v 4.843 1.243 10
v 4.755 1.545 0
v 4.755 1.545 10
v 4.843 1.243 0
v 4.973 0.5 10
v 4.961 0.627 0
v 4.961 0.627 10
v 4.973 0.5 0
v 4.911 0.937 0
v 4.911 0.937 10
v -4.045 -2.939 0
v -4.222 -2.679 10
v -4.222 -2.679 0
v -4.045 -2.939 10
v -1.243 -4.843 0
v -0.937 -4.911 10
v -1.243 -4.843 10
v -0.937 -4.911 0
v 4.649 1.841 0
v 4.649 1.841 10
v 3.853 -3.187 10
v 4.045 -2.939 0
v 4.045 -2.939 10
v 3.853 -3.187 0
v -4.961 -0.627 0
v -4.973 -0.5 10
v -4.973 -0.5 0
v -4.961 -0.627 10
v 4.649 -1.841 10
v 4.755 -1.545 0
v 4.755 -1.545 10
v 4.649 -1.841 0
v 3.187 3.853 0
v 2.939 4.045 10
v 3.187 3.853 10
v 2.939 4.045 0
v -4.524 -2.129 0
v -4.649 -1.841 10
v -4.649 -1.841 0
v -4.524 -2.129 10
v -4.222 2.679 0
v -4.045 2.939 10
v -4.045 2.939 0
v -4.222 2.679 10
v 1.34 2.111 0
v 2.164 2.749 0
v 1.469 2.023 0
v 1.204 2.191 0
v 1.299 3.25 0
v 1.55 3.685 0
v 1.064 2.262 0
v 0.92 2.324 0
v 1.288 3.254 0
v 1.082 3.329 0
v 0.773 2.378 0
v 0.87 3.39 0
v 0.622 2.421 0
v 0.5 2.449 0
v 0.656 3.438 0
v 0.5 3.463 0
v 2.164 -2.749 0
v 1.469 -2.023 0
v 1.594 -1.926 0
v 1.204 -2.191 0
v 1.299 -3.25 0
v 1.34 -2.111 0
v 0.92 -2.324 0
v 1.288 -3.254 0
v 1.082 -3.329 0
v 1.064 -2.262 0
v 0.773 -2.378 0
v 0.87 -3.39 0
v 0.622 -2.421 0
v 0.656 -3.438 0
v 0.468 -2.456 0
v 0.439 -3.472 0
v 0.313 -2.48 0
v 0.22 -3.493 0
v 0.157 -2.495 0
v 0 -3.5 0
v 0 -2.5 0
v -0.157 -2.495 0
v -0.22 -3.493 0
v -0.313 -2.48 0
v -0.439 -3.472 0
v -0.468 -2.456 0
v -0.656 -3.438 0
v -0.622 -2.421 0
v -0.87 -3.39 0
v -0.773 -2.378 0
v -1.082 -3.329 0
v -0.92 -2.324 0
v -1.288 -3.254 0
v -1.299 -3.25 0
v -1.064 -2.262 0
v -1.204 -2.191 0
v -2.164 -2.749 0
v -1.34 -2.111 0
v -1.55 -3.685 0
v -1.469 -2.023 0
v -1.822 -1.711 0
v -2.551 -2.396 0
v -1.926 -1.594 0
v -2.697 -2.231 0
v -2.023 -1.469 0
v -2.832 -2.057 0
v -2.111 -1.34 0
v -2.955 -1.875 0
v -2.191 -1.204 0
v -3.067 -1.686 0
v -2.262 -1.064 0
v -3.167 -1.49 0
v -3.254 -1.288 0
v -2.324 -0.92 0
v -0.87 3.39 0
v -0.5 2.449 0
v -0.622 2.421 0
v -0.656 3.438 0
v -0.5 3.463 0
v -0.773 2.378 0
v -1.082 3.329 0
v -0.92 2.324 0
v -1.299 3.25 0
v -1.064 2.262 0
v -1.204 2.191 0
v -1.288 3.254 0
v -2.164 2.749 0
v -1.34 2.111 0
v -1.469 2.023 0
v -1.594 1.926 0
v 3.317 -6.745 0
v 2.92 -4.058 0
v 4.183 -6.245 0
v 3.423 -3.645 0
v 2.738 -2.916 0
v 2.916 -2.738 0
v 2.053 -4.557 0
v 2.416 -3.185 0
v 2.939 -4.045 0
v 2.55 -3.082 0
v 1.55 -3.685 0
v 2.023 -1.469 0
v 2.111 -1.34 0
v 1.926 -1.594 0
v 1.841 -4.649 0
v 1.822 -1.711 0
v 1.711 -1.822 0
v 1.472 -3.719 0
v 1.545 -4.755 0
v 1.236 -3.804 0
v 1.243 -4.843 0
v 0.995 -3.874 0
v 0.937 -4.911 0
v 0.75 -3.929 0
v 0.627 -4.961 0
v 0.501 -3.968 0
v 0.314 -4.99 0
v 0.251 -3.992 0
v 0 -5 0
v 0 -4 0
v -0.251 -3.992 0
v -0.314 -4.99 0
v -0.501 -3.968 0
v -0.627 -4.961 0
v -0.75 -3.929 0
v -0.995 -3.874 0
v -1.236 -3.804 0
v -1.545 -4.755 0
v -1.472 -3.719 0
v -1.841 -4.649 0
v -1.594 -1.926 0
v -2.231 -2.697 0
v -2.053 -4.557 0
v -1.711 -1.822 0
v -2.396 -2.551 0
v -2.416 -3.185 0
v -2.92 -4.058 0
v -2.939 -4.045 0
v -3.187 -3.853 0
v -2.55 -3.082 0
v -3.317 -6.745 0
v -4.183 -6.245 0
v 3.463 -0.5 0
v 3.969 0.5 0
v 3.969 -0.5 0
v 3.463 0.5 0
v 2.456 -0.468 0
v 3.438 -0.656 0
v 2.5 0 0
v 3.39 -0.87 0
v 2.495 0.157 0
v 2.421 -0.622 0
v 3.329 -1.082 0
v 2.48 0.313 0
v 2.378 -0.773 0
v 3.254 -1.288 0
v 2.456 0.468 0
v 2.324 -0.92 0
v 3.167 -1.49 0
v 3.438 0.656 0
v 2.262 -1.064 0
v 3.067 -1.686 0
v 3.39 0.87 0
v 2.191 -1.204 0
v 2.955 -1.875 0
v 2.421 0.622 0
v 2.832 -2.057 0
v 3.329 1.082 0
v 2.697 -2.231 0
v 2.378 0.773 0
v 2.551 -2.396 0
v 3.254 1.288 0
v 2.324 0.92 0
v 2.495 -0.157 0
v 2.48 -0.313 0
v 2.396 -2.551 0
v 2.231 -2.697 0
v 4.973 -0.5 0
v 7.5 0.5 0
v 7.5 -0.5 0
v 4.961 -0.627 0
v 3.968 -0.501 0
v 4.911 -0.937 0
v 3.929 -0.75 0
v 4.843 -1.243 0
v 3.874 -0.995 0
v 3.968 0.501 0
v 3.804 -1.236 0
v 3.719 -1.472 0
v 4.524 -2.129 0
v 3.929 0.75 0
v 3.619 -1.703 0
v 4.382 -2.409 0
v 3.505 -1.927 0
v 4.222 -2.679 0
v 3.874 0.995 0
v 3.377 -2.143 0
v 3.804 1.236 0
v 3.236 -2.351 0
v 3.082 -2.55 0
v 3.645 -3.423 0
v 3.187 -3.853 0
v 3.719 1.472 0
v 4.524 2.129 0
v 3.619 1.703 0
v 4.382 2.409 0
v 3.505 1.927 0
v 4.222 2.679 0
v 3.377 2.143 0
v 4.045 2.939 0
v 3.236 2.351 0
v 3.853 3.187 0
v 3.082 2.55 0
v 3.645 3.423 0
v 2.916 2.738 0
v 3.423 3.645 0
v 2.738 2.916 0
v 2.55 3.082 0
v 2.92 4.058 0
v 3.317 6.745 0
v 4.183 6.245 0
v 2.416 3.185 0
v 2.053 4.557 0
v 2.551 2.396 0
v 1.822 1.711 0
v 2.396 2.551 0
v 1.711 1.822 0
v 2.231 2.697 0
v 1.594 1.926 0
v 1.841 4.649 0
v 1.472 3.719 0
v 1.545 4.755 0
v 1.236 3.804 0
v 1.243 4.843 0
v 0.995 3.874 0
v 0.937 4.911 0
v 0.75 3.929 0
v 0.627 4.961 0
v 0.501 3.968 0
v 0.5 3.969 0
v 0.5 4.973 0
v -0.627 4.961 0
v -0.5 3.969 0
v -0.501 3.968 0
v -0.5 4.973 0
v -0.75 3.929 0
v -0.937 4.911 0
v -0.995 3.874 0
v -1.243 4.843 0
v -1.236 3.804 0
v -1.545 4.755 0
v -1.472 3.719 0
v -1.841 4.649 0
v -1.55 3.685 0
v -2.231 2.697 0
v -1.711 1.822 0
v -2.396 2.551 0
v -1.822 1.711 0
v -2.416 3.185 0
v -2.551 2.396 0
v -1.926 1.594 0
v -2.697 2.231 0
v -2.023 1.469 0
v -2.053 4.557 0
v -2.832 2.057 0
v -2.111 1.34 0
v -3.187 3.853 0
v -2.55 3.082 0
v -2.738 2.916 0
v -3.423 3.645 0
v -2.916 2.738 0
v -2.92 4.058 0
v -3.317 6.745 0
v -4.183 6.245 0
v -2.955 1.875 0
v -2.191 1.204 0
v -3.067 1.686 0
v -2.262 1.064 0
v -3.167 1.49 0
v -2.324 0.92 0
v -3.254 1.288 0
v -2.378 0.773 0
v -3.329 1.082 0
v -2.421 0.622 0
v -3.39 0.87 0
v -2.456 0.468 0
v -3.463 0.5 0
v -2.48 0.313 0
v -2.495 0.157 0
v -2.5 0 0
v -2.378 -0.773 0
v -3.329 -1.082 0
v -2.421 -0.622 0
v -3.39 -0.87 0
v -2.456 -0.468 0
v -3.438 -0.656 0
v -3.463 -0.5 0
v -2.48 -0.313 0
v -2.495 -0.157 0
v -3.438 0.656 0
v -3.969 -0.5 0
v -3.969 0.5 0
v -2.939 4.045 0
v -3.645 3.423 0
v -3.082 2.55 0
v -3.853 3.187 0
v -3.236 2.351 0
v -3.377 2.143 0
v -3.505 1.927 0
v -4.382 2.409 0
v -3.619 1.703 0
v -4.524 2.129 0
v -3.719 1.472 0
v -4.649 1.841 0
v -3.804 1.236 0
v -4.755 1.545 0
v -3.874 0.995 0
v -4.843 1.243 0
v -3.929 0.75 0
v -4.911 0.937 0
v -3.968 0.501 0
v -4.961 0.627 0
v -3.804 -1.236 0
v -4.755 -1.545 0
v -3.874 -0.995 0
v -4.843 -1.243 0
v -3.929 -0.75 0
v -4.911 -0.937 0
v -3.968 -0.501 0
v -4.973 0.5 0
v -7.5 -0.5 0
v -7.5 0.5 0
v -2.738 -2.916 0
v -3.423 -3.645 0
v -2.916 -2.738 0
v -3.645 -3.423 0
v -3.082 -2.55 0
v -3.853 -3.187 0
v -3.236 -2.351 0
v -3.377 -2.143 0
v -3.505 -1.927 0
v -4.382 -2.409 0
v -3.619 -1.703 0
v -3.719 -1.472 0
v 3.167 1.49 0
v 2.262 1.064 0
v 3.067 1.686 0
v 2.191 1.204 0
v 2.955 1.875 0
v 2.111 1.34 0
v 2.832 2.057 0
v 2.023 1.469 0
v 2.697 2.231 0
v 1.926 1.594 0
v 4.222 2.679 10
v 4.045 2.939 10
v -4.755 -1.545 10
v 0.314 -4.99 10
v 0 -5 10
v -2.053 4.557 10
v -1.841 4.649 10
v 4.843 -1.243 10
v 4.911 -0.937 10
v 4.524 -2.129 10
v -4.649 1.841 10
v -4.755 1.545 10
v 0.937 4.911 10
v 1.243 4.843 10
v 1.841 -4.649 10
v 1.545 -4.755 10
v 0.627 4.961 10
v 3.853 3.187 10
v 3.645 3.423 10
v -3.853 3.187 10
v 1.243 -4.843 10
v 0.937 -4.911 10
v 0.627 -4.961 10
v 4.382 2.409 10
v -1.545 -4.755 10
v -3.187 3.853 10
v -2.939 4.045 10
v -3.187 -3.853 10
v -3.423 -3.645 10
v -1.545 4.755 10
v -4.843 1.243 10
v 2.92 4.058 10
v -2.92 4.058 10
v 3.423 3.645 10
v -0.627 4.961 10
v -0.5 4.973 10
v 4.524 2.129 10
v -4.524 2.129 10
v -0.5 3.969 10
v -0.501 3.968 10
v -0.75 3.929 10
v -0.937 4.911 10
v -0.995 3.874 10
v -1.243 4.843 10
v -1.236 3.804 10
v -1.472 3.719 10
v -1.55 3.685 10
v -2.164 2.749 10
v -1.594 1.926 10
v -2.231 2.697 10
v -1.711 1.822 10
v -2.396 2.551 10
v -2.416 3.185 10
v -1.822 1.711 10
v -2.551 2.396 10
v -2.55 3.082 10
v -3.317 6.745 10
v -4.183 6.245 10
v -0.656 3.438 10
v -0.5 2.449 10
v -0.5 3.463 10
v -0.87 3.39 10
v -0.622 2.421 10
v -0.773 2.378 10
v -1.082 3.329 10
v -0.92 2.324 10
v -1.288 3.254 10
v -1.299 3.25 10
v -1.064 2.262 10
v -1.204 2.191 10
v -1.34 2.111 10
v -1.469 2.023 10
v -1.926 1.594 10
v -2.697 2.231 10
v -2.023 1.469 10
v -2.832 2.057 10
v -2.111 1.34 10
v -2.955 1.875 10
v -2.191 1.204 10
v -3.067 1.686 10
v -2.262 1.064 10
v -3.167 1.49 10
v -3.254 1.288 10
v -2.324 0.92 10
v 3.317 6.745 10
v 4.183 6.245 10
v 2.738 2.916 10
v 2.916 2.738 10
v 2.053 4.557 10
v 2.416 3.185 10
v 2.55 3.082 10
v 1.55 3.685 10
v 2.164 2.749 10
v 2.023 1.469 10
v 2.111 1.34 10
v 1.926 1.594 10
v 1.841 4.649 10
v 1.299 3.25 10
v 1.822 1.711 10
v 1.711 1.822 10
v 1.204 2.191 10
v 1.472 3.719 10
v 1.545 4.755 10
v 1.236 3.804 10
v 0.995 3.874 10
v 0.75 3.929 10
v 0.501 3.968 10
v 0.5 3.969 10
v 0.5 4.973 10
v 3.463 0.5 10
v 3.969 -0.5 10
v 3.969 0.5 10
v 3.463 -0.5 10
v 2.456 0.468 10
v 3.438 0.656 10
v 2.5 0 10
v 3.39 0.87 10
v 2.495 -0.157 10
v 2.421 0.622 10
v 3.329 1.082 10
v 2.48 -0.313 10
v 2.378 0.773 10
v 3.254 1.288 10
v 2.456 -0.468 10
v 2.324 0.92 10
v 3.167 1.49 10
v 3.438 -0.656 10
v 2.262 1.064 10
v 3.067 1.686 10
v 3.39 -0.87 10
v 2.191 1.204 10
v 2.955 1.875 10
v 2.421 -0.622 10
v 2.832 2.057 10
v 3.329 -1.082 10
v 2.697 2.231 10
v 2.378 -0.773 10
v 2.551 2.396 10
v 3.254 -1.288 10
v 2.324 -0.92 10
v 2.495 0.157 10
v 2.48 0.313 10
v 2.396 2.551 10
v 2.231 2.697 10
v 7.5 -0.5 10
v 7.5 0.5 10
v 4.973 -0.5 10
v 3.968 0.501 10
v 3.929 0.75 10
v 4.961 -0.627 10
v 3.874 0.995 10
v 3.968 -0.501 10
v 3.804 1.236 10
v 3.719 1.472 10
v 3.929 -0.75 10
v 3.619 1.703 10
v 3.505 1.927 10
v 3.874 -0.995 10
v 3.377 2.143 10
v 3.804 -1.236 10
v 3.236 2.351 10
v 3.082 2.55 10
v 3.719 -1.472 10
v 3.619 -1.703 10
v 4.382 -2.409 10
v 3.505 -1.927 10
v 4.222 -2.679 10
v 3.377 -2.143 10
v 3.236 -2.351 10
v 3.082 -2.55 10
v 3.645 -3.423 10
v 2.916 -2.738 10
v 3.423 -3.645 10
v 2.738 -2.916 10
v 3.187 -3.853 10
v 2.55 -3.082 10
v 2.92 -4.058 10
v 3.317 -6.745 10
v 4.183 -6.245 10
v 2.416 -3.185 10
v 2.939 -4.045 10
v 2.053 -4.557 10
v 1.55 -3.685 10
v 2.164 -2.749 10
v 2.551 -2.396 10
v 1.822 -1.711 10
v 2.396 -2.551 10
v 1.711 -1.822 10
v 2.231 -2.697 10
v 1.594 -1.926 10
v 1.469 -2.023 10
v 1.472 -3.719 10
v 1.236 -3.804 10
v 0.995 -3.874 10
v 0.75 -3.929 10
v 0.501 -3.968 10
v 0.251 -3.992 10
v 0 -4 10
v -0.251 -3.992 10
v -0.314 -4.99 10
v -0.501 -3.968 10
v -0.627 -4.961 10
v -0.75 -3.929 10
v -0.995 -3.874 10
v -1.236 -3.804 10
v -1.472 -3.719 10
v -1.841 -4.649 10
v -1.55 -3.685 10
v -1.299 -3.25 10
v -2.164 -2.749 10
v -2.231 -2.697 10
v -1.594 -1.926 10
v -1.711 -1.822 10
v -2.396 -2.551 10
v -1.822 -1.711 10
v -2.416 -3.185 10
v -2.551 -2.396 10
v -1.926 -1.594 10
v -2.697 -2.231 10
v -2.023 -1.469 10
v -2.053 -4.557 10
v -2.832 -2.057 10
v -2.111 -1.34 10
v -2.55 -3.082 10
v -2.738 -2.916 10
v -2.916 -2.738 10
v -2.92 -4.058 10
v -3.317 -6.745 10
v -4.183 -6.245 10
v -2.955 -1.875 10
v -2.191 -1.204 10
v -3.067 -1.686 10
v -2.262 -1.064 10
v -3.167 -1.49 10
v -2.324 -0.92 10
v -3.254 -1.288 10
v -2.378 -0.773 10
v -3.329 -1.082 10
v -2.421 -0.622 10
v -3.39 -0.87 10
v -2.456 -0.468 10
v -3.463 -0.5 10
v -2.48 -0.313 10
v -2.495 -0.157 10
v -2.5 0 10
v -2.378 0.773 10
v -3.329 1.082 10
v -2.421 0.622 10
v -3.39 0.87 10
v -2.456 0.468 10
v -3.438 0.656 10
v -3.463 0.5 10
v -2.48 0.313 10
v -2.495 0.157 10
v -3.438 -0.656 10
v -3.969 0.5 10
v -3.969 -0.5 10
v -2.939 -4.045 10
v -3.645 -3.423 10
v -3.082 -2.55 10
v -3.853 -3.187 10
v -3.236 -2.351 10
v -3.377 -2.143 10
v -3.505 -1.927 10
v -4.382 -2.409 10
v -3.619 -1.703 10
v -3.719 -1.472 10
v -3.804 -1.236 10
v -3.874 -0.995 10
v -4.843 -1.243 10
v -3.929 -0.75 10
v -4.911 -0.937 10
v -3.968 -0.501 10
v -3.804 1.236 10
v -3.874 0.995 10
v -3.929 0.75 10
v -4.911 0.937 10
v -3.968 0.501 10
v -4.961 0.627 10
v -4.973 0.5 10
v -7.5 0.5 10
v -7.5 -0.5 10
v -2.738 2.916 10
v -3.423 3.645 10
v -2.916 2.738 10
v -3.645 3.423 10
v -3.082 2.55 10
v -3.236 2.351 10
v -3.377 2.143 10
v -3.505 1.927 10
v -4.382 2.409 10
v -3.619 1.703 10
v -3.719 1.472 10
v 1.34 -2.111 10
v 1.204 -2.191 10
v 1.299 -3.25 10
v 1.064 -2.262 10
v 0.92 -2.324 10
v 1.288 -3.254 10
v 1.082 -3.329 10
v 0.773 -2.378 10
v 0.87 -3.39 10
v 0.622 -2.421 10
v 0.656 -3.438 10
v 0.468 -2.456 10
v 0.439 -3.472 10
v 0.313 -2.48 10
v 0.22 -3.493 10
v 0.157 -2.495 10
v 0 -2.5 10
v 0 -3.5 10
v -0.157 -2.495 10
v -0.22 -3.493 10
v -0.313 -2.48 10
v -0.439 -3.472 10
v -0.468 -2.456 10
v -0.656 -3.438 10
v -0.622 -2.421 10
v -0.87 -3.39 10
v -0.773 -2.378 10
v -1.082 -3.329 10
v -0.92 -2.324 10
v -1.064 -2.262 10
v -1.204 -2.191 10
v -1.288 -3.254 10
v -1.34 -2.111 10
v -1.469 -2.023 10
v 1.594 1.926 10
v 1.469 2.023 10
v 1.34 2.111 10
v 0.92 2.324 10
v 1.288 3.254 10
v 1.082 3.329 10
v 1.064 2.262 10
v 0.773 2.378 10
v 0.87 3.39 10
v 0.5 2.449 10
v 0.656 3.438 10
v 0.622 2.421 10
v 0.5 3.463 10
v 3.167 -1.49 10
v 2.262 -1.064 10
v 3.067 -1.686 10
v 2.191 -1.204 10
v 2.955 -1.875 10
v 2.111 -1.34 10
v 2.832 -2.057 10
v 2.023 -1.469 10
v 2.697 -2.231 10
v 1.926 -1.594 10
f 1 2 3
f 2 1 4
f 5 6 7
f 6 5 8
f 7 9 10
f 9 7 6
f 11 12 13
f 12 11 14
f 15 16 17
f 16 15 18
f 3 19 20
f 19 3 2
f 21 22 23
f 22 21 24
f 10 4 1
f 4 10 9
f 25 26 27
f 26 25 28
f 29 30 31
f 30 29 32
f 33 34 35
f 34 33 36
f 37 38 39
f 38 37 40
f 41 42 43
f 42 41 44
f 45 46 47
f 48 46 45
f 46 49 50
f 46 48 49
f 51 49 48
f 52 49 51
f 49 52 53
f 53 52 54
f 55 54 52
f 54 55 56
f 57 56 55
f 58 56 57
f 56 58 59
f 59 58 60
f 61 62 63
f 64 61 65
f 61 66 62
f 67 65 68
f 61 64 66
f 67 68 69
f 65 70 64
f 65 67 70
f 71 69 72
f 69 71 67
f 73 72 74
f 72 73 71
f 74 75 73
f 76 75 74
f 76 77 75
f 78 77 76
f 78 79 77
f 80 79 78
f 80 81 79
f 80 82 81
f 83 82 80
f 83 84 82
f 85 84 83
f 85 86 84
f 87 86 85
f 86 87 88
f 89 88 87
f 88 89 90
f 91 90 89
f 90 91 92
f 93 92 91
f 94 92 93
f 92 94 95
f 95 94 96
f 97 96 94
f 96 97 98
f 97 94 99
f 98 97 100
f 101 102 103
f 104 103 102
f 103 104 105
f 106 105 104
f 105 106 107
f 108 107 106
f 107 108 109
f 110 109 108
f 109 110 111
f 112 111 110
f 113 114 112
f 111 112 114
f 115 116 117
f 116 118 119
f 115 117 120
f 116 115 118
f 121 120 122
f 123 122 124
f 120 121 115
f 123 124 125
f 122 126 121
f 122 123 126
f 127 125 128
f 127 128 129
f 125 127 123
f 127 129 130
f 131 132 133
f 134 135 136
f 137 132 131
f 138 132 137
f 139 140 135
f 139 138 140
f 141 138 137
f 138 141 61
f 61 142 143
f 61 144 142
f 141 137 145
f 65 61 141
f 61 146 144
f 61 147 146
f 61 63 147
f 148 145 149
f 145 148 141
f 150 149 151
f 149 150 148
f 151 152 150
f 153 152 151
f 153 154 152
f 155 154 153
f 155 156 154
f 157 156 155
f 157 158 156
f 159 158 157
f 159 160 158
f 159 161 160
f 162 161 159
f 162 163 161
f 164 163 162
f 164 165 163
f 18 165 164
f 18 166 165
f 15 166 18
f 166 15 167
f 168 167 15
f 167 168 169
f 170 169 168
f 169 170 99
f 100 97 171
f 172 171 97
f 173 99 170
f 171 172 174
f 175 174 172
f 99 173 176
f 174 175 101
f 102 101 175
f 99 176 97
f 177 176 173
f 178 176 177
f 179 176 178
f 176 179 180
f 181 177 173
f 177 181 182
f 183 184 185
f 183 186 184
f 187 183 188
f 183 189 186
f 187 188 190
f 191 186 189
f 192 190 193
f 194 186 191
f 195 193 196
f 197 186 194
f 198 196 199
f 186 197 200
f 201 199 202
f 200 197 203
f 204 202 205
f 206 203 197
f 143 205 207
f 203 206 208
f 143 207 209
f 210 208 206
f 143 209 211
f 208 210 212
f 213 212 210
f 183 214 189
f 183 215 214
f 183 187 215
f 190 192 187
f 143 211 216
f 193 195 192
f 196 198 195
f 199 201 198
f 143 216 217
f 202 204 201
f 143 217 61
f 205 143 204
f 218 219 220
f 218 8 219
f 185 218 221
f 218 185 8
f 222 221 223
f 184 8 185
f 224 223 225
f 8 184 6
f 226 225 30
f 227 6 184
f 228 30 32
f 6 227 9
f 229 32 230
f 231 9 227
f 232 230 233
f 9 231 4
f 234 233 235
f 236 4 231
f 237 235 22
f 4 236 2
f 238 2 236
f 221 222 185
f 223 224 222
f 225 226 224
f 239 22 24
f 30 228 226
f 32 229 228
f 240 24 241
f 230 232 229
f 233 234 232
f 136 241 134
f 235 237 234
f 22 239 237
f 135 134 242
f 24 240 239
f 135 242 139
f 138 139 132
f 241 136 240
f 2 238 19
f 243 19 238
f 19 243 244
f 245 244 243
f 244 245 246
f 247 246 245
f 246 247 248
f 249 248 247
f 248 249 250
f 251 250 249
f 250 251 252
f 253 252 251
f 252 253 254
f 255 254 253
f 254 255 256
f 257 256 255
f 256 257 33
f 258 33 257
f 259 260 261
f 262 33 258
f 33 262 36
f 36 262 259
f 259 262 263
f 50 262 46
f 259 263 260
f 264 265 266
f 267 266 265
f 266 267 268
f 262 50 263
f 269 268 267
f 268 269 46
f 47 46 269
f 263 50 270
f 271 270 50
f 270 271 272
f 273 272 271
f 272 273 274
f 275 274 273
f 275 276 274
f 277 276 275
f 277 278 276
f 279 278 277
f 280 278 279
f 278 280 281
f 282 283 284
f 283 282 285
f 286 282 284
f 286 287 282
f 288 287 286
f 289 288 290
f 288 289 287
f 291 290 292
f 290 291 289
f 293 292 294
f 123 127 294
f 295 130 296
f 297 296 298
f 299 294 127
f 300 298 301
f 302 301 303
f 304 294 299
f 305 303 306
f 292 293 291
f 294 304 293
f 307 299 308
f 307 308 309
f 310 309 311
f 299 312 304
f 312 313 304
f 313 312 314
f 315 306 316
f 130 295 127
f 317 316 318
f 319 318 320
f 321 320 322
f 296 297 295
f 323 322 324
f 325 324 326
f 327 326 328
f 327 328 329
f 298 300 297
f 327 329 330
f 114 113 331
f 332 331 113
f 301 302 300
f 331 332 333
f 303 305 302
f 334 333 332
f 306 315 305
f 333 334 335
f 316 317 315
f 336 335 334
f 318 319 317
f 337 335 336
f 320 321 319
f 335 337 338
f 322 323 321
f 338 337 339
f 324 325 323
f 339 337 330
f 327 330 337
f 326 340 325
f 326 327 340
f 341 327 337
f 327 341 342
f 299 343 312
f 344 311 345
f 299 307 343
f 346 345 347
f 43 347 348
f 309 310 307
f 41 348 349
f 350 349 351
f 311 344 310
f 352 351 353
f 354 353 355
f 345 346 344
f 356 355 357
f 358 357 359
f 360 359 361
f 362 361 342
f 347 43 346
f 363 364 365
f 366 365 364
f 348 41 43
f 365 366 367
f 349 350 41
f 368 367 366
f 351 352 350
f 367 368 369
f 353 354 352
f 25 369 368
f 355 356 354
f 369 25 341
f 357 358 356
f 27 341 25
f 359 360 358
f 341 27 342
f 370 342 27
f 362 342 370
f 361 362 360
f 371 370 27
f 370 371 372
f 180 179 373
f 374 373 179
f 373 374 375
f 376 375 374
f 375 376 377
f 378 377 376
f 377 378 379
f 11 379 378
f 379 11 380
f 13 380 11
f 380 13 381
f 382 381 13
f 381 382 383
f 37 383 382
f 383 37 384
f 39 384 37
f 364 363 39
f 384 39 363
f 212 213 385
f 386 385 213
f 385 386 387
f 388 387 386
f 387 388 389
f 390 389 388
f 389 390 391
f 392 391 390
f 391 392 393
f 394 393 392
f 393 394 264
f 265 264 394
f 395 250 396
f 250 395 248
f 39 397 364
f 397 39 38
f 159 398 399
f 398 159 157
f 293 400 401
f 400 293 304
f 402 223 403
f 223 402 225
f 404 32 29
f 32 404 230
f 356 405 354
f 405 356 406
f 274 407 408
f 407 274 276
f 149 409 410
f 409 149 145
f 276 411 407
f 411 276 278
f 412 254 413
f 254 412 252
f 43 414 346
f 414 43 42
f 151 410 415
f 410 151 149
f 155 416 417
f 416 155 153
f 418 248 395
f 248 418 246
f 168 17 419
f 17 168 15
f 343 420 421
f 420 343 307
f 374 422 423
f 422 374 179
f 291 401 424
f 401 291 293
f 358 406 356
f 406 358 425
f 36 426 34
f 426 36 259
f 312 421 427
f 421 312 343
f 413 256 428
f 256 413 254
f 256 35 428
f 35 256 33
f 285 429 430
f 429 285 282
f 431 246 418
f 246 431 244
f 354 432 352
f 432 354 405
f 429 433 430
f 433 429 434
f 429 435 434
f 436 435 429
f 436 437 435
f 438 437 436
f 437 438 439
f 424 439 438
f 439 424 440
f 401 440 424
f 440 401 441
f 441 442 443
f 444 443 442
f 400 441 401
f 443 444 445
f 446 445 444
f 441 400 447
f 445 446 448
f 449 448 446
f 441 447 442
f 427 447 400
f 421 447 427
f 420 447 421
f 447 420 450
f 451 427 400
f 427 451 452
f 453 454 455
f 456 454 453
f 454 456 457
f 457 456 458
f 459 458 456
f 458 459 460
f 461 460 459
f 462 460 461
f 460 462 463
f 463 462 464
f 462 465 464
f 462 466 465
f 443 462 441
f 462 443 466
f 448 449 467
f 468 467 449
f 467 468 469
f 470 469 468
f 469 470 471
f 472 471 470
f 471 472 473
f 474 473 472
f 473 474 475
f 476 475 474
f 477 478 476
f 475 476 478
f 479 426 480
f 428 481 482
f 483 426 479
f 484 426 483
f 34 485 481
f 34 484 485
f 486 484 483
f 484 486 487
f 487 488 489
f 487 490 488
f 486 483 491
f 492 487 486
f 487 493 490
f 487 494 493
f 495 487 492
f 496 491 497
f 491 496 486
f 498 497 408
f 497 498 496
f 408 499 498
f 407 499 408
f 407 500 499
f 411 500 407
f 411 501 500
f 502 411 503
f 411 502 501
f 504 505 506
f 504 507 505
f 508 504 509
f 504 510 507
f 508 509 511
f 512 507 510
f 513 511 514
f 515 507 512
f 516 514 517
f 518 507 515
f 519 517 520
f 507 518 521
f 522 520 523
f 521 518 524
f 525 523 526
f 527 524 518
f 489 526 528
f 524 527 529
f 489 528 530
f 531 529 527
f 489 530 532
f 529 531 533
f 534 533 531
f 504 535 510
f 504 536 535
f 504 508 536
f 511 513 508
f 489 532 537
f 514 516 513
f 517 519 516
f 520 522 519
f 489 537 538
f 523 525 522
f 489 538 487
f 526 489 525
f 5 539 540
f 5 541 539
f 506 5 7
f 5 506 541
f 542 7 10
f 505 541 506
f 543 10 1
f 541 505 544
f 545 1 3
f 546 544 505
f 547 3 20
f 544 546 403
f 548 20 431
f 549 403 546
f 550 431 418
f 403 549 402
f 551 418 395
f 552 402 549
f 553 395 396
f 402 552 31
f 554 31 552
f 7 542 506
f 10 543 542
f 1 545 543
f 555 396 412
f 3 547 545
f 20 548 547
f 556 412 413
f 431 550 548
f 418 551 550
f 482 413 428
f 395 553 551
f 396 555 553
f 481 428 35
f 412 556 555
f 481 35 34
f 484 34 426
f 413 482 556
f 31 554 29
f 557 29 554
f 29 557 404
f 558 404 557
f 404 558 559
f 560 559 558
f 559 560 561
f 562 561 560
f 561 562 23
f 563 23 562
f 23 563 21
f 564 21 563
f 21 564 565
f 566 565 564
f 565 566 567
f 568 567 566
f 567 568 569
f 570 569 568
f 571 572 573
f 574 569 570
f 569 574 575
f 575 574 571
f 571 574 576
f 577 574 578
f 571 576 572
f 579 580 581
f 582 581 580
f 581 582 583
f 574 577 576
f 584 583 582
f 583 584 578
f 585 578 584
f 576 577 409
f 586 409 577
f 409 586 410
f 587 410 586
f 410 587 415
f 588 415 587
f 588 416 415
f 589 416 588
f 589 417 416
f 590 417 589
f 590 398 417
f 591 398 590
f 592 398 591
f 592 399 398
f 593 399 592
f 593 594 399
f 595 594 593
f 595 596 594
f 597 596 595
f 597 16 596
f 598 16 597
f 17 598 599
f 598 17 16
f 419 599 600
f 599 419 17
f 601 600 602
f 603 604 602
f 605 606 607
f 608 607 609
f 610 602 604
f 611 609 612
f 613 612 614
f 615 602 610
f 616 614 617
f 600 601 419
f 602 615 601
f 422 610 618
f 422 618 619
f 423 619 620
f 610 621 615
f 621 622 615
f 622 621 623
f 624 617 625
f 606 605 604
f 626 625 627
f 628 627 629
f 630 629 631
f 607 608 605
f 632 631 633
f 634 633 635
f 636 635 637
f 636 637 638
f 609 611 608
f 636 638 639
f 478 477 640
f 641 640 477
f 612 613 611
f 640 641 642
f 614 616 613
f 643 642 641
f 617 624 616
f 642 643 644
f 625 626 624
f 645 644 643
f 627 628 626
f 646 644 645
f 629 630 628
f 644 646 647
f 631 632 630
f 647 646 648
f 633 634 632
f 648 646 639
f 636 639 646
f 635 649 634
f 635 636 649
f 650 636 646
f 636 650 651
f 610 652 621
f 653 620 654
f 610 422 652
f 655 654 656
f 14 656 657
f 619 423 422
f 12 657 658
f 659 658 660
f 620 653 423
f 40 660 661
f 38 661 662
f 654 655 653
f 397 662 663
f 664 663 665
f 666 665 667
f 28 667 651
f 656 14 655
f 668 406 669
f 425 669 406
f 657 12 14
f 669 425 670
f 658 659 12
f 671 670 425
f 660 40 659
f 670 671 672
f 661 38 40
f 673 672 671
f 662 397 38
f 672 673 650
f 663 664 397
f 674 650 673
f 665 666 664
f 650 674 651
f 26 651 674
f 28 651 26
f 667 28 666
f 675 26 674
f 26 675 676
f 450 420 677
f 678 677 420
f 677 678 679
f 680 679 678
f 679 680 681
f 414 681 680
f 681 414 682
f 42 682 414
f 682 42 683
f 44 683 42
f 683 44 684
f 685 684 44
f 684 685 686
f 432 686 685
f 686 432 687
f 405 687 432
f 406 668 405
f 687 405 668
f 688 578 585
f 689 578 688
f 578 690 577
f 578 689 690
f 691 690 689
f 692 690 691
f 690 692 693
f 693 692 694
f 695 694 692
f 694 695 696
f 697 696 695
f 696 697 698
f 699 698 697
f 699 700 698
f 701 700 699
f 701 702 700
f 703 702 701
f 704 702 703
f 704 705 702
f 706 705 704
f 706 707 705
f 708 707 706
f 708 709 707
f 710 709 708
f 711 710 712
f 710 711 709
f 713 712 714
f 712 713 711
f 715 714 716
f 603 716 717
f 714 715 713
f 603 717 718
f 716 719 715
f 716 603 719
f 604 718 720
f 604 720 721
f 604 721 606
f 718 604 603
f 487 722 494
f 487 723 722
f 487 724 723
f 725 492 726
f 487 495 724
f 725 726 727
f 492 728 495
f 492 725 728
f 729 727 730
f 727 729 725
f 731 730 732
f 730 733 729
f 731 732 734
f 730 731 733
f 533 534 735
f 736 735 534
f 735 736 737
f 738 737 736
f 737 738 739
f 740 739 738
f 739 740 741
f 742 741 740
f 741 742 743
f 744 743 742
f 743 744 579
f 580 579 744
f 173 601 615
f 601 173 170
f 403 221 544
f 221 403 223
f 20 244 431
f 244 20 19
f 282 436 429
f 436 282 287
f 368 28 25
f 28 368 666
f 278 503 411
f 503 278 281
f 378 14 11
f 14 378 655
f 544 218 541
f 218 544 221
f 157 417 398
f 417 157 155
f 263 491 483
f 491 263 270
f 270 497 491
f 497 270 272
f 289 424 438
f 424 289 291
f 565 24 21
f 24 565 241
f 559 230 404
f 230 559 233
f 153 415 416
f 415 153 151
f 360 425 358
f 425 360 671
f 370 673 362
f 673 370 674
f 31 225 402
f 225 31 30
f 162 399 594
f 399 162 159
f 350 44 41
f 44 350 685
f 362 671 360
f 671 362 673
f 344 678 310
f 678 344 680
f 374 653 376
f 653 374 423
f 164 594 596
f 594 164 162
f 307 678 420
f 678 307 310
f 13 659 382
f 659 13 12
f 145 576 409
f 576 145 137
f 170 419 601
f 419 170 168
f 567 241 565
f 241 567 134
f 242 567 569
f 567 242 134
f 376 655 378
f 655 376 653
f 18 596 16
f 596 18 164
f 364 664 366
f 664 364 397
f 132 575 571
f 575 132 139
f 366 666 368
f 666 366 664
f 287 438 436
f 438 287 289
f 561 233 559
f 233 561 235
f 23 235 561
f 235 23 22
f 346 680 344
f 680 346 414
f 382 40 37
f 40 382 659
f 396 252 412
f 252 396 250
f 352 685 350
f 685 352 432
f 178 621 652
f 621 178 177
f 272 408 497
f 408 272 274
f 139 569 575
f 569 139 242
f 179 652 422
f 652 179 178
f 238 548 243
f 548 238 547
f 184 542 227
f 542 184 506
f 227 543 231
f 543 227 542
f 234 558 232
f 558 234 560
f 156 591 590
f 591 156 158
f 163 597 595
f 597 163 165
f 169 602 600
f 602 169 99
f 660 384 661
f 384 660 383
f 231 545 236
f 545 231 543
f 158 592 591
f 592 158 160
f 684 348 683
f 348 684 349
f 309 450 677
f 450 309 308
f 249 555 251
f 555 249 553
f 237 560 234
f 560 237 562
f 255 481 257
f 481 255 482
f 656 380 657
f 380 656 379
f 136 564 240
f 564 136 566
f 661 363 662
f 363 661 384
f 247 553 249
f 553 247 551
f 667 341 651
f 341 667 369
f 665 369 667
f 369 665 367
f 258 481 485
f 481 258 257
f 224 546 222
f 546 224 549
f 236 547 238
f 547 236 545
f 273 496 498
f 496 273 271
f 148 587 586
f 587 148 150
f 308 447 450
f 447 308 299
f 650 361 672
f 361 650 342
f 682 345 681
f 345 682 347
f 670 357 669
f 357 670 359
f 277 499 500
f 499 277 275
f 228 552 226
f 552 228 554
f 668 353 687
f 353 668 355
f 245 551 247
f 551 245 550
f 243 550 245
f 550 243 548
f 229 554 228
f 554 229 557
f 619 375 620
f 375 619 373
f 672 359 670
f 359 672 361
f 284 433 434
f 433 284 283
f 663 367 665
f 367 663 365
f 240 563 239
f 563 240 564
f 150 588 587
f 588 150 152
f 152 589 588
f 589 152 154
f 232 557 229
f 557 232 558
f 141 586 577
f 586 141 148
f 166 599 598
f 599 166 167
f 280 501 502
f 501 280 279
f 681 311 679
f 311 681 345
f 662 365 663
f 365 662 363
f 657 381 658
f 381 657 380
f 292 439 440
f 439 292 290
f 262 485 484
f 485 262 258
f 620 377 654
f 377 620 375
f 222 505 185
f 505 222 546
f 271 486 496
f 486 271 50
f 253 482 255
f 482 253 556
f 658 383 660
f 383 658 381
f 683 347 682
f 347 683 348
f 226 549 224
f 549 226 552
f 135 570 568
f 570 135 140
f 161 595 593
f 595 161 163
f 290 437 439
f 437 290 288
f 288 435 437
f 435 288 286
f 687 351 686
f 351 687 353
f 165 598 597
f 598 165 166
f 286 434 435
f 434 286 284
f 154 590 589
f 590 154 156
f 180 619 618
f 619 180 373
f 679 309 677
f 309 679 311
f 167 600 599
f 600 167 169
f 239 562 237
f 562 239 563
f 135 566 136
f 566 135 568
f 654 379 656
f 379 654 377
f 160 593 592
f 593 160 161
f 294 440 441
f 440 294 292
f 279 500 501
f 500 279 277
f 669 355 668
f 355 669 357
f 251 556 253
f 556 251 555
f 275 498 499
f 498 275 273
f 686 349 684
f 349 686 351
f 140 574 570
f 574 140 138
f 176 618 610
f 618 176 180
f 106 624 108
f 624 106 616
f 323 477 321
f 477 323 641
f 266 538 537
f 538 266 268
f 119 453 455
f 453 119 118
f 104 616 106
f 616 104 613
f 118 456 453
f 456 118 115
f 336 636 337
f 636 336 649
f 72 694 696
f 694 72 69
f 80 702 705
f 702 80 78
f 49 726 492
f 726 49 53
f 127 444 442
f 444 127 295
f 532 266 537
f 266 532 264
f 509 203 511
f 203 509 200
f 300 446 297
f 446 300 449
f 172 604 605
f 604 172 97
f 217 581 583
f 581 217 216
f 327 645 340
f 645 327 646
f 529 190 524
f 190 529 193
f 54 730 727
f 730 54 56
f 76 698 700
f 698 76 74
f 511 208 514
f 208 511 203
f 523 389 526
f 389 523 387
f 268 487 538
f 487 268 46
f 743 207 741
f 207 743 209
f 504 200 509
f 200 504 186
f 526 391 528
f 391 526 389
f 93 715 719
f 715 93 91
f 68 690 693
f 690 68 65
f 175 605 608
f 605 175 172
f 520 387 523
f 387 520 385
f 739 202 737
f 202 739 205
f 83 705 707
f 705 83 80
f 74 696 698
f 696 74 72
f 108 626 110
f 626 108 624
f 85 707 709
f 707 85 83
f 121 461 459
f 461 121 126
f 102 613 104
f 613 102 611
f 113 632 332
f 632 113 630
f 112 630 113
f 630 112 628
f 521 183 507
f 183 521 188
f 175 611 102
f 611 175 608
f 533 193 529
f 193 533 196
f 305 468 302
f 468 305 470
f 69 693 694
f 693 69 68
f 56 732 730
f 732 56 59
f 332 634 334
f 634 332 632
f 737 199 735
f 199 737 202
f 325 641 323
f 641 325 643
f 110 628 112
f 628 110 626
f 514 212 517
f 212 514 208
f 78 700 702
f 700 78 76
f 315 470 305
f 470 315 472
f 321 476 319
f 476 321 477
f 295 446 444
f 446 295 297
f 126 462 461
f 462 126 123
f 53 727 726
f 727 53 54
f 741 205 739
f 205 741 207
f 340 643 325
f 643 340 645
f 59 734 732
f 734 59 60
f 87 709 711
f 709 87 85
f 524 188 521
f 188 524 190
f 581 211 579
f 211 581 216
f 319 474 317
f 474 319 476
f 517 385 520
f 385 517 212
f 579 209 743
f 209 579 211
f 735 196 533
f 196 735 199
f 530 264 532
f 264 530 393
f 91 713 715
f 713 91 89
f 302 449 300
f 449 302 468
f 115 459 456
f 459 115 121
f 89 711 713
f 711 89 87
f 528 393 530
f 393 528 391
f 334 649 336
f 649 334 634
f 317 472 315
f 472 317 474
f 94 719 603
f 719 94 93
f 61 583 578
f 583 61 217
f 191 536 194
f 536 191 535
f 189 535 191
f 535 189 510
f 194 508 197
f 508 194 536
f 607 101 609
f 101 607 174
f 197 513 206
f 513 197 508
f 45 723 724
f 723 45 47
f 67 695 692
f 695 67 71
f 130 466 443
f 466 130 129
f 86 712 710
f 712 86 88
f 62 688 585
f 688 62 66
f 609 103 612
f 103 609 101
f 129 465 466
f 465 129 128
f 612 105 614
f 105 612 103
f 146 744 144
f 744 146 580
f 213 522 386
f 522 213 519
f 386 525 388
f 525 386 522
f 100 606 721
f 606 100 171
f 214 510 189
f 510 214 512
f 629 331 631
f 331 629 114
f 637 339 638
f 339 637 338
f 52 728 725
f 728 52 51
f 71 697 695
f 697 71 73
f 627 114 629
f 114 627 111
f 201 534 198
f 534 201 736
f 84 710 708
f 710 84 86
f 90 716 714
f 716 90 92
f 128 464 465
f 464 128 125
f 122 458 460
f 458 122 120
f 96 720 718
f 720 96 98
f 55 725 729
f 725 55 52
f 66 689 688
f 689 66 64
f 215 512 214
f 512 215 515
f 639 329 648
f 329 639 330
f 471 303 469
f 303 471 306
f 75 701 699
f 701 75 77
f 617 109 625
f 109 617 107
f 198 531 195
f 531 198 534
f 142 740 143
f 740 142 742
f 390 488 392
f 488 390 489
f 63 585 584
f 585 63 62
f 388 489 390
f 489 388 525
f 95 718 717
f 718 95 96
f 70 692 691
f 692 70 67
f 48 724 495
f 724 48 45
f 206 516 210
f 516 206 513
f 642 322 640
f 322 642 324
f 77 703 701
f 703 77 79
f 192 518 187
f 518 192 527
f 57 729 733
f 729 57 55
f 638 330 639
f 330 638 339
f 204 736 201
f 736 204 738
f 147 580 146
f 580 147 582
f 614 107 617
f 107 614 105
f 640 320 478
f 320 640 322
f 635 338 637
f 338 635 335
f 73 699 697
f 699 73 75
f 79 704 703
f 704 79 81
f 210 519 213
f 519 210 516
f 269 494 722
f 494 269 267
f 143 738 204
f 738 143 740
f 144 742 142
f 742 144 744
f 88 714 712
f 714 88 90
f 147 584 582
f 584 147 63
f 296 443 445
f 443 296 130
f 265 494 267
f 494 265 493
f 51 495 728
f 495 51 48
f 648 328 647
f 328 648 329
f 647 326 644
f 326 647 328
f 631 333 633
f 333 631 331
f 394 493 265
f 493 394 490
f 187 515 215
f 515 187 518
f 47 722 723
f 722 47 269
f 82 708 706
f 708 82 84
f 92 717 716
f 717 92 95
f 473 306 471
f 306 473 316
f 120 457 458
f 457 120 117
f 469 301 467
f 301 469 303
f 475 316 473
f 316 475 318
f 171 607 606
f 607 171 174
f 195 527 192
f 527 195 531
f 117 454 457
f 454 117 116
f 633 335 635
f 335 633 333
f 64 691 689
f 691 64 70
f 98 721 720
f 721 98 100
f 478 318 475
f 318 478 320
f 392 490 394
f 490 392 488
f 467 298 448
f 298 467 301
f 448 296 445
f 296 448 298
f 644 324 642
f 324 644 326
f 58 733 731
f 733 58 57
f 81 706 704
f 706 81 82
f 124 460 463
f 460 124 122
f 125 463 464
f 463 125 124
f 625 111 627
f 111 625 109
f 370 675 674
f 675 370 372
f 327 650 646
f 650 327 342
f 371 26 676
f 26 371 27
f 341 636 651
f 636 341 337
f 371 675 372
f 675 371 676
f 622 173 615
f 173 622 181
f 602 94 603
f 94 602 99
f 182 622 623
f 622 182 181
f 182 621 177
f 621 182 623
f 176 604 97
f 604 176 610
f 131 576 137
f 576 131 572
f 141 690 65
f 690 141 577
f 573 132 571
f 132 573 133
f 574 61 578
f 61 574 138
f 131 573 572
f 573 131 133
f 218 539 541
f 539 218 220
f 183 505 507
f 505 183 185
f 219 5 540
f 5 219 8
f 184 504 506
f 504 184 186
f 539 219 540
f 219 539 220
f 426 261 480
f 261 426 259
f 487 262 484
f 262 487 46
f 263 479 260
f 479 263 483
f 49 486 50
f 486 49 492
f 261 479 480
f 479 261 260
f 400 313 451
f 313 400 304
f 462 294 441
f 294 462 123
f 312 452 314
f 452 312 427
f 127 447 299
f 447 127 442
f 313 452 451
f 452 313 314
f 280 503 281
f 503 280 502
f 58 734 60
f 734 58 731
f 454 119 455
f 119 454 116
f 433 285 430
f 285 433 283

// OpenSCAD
$fn=100;
bike_pin(10,5,10,1,6);

module bike_pin(height, iD, oD, thickness, pins){
    difference(){
        union(){
            difference(){
                cylinder(h = height, d=oD);
                cylinder(h = height, d=oD-thickness*2);
            }
            
            difference(){
                cylinder(h = height, d=iD+thickness*2);
                cylinder(h = height, d=iD);
            }

            for (i=[0:pins-1]){
                rotate([0,0,i*360/pins+90])
                translate([-thickness/2,iD/2,0])
                cube([thickness,oD-iD,height]);
            }
        }
        
        translate([-thickness/2,0,0])
        cube([thickness,oD/2,height]);
    }
}
